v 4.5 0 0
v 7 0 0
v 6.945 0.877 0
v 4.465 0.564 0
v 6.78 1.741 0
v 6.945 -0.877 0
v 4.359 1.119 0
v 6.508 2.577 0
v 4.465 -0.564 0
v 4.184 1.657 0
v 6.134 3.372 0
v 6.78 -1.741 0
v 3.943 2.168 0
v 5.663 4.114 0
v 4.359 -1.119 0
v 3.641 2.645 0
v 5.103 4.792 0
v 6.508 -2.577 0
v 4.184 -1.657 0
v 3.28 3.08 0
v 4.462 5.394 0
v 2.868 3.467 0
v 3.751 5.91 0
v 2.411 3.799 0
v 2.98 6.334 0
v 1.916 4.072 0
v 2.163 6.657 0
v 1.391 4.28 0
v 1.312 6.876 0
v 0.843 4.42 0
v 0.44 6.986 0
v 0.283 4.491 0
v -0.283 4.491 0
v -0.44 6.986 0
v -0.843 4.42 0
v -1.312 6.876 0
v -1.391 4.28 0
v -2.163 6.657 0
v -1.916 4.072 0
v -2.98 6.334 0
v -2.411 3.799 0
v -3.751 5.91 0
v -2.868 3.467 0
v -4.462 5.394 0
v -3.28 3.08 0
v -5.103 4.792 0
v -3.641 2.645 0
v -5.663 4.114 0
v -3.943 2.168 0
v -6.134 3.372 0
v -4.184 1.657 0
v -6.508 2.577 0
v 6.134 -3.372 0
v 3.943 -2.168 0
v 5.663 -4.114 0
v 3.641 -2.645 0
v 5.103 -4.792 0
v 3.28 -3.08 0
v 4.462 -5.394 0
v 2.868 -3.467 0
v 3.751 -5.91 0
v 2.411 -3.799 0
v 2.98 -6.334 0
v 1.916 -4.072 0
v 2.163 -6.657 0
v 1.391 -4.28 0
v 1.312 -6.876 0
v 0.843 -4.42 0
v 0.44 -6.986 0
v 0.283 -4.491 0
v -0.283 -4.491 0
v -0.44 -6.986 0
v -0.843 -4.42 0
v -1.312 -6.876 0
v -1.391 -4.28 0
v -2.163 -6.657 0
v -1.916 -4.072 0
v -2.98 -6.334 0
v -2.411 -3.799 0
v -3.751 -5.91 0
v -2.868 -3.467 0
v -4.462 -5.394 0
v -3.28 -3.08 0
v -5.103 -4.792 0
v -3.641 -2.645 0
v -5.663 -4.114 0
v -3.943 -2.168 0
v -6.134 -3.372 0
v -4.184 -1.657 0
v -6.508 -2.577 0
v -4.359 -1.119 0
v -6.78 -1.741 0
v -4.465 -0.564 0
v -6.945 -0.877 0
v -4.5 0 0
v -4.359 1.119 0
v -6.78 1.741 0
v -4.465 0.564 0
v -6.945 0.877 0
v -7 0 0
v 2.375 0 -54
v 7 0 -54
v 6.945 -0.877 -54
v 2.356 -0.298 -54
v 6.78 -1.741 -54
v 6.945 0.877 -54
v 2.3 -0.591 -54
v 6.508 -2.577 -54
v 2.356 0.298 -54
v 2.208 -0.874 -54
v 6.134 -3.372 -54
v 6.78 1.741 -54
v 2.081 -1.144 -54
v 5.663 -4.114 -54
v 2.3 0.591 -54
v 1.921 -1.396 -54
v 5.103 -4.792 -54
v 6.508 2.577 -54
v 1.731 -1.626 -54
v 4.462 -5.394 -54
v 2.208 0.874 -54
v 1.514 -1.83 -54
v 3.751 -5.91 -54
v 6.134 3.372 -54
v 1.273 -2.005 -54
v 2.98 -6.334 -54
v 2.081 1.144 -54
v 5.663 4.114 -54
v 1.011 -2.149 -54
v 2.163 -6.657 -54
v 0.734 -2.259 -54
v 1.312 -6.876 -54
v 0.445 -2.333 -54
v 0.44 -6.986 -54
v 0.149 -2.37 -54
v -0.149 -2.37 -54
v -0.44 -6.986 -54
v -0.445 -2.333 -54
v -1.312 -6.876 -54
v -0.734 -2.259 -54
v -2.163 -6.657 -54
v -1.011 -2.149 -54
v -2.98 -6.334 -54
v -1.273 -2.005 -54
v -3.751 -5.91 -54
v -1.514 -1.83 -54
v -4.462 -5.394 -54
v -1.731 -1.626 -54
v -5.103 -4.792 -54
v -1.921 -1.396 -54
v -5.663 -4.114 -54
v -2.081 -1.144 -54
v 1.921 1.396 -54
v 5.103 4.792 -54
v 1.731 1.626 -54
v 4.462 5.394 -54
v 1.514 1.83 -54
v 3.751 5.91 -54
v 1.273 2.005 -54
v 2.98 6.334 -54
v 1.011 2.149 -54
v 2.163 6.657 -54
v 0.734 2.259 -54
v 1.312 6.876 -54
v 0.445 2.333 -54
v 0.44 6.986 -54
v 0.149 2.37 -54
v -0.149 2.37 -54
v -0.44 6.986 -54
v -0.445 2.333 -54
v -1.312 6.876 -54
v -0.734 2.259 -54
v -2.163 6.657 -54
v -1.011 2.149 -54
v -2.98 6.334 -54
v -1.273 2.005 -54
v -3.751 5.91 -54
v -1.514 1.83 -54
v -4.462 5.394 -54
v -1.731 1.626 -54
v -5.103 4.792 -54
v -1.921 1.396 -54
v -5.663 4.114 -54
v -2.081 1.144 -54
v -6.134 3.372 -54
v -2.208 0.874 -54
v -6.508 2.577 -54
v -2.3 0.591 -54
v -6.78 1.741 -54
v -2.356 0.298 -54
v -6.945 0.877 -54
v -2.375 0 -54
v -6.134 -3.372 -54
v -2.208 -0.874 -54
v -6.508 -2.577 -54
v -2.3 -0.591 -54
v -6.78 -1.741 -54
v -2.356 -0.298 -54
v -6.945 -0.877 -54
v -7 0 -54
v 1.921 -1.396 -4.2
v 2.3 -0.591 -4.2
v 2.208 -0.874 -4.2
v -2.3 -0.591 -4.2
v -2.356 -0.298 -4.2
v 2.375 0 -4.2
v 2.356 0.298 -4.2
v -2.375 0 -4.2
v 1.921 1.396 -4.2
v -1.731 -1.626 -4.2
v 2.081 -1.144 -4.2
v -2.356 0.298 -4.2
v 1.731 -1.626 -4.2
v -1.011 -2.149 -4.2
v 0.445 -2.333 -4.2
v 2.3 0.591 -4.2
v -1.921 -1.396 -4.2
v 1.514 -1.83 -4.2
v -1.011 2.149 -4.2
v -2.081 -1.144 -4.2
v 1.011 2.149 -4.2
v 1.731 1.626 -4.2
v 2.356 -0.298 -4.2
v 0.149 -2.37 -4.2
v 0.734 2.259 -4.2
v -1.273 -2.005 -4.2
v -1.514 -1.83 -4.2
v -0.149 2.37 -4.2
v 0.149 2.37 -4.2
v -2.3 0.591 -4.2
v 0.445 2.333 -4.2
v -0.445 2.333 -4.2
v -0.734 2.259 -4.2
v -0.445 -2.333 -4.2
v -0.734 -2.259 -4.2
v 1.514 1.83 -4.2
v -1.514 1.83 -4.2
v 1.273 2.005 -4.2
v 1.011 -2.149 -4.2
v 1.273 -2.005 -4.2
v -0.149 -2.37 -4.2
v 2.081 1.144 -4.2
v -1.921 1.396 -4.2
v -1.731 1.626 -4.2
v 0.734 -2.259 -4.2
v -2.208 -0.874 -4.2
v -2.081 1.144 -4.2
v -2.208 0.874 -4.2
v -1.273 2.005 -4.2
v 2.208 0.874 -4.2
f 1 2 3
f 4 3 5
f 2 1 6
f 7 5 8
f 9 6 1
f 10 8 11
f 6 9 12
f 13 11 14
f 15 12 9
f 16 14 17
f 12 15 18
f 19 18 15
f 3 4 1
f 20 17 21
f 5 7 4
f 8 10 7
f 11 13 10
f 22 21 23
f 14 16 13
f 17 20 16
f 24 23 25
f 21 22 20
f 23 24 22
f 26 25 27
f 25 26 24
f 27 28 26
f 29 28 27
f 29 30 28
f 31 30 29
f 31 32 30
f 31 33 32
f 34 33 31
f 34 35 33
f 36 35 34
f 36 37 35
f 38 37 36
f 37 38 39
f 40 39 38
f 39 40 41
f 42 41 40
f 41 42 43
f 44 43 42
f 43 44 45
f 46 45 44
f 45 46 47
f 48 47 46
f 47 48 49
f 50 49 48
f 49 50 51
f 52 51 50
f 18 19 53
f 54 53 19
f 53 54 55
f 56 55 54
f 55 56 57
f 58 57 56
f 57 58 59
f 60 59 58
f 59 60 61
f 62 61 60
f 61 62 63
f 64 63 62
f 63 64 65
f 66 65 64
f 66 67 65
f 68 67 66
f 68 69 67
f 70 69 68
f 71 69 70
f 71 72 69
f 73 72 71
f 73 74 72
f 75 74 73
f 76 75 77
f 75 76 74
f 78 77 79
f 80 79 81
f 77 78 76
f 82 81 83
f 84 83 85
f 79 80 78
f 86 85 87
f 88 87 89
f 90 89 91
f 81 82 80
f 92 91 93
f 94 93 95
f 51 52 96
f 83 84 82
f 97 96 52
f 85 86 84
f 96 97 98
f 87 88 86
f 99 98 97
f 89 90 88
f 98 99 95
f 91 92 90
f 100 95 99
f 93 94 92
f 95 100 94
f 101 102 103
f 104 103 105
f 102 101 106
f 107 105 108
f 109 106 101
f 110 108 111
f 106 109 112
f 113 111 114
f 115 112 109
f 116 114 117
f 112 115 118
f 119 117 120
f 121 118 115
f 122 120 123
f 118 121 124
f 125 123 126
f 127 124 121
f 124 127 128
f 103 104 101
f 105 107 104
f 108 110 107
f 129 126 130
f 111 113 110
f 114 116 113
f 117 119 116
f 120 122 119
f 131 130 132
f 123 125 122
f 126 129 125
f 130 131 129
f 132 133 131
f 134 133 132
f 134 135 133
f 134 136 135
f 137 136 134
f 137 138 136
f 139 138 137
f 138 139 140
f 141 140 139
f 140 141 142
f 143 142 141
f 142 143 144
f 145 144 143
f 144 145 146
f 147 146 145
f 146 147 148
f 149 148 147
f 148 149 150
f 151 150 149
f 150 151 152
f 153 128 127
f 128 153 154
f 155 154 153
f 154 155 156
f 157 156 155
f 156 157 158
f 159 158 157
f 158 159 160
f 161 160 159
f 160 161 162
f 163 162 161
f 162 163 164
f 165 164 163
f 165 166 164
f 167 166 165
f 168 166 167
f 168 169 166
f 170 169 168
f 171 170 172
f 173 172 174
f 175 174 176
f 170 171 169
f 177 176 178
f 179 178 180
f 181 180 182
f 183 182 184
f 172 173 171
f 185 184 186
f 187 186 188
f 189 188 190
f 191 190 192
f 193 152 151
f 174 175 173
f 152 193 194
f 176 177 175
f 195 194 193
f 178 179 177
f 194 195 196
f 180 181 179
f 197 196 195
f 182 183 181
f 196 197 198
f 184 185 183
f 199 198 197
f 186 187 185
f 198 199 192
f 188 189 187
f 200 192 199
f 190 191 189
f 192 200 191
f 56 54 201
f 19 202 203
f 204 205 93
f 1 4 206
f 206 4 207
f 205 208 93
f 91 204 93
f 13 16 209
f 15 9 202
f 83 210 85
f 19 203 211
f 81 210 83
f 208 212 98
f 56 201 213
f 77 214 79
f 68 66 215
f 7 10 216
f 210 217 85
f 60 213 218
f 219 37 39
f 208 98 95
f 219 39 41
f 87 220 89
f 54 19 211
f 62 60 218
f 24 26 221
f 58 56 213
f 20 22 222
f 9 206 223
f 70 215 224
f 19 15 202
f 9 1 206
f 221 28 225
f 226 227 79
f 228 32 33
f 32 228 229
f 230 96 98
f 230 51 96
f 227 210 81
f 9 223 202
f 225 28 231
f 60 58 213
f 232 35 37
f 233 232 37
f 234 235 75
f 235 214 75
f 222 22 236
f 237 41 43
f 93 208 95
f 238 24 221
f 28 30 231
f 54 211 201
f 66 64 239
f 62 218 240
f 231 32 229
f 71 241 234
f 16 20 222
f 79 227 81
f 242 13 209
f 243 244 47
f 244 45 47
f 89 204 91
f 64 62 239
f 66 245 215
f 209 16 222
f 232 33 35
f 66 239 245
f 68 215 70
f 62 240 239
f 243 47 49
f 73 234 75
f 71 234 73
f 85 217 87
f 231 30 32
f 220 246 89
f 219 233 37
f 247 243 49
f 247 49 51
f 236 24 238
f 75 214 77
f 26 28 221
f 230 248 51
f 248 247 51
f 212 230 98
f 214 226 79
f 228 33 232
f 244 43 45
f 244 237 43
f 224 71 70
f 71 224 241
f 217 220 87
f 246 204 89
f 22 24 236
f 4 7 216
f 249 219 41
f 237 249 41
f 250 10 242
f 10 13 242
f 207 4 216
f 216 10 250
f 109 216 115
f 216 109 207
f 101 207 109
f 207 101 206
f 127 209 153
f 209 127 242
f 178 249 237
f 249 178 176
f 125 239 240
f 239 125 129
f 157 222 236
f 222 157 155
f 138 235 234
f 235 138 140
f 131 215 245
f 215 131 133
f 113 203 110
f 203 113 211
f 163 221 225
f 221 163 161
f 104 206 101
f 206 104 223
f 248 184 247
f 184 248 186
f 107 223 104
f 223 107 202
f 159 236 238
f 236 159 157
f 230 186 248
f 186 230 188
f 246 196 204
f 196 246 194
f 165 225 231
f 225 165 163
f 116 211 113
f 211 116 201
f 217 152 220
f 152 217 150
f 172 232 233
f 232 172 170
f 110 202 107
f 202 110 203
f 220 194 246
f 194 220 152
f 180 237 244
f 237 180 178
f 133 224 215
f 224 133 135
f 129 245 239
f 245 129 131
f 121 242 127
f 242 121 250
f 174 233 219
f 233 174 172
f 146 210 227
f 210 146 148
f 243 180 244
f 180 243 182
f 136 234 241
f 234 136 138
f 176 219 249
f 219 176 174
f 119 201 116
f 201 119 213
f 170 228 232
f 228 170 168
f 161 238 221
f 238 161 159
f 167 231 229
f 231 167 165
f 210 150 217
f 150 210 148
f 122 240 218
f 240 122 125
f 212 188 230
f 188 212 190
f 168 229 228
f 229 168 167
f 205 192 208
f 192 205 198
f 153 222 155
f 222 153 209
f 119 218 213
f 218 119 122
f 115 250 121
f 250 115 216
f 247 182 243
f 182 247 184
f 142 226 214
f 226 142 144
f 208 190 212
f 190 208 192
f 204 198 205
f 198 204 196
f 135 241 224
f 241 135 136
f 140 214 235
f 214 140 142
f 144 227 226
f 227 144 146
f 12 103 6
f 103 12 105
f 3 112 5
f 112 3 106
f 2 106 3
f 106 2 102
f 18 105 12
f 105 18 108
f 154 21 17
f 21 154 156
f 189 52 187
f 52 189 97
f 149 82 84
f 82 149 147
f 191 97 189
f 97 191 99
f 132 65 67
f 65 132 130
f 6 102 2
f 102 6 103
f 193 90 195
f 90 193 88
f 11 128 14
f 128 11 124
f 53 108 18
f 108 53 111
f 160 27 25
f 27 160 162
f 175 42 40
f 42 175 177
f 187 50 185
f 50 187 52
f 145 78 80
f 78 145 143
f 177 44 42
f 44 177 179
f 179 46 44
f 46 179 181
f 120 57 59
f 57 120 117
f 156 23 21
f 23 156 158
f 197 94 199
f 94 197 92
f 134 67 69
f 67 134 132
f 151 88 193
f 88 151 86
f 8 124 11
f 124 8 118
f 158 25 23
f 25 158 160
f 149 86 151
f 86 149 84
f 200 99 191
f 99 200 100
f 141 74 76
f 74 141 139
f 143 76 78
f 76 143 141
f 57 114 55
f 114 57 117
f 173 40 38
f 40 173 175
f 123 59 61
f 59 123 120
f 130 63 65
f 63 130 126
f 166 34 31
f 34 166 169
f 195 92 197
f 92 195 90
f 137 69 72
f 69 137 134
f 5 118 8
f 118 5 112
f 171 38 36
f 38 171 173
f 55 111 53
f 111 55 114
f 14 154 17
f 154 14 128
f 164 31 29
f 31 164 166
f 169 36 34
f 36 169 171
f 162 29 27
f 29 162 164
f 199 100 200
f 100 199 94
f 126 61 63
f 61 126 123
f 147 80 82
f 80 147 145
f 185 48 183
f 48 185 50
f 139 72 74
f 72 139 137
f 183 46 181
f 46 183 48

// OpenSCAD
$fn = 50;


difference() {
	union() {
		translate(v = [0, 0, -54.0000000000]) {
			cylinder(h = 54, r = 7.0000000000);
		}
		cylinder(h = 0, r = 10.0000000000);
	}
	union() {
		translate(v = [0, 0, 0]) {
			rotate(a = [0, 0, 0]) {
				difference() {
					union() {
						#translate(v = [0, 0, -54.0000000000]) {
							cylinder(h = 54, r = 2.2500000000);
						}
						#translate(v = [0, 0, -4.2000000000]) {
							cylinder(h = 4.2000000000, r1 = 2.3750000000, r2 = 4.5000000000);
						}
						#translate(v = [0, 0, -54.0000000000]) {
							cylinder(h = 54, r = 2.3750000000);
						}
						#translate(v = [0, 0, -54.0000000000]) {
							cylinder(h = 54, r = 2.2500000000);
						}
					}
					union();
				}
			}
		}
	}
}
